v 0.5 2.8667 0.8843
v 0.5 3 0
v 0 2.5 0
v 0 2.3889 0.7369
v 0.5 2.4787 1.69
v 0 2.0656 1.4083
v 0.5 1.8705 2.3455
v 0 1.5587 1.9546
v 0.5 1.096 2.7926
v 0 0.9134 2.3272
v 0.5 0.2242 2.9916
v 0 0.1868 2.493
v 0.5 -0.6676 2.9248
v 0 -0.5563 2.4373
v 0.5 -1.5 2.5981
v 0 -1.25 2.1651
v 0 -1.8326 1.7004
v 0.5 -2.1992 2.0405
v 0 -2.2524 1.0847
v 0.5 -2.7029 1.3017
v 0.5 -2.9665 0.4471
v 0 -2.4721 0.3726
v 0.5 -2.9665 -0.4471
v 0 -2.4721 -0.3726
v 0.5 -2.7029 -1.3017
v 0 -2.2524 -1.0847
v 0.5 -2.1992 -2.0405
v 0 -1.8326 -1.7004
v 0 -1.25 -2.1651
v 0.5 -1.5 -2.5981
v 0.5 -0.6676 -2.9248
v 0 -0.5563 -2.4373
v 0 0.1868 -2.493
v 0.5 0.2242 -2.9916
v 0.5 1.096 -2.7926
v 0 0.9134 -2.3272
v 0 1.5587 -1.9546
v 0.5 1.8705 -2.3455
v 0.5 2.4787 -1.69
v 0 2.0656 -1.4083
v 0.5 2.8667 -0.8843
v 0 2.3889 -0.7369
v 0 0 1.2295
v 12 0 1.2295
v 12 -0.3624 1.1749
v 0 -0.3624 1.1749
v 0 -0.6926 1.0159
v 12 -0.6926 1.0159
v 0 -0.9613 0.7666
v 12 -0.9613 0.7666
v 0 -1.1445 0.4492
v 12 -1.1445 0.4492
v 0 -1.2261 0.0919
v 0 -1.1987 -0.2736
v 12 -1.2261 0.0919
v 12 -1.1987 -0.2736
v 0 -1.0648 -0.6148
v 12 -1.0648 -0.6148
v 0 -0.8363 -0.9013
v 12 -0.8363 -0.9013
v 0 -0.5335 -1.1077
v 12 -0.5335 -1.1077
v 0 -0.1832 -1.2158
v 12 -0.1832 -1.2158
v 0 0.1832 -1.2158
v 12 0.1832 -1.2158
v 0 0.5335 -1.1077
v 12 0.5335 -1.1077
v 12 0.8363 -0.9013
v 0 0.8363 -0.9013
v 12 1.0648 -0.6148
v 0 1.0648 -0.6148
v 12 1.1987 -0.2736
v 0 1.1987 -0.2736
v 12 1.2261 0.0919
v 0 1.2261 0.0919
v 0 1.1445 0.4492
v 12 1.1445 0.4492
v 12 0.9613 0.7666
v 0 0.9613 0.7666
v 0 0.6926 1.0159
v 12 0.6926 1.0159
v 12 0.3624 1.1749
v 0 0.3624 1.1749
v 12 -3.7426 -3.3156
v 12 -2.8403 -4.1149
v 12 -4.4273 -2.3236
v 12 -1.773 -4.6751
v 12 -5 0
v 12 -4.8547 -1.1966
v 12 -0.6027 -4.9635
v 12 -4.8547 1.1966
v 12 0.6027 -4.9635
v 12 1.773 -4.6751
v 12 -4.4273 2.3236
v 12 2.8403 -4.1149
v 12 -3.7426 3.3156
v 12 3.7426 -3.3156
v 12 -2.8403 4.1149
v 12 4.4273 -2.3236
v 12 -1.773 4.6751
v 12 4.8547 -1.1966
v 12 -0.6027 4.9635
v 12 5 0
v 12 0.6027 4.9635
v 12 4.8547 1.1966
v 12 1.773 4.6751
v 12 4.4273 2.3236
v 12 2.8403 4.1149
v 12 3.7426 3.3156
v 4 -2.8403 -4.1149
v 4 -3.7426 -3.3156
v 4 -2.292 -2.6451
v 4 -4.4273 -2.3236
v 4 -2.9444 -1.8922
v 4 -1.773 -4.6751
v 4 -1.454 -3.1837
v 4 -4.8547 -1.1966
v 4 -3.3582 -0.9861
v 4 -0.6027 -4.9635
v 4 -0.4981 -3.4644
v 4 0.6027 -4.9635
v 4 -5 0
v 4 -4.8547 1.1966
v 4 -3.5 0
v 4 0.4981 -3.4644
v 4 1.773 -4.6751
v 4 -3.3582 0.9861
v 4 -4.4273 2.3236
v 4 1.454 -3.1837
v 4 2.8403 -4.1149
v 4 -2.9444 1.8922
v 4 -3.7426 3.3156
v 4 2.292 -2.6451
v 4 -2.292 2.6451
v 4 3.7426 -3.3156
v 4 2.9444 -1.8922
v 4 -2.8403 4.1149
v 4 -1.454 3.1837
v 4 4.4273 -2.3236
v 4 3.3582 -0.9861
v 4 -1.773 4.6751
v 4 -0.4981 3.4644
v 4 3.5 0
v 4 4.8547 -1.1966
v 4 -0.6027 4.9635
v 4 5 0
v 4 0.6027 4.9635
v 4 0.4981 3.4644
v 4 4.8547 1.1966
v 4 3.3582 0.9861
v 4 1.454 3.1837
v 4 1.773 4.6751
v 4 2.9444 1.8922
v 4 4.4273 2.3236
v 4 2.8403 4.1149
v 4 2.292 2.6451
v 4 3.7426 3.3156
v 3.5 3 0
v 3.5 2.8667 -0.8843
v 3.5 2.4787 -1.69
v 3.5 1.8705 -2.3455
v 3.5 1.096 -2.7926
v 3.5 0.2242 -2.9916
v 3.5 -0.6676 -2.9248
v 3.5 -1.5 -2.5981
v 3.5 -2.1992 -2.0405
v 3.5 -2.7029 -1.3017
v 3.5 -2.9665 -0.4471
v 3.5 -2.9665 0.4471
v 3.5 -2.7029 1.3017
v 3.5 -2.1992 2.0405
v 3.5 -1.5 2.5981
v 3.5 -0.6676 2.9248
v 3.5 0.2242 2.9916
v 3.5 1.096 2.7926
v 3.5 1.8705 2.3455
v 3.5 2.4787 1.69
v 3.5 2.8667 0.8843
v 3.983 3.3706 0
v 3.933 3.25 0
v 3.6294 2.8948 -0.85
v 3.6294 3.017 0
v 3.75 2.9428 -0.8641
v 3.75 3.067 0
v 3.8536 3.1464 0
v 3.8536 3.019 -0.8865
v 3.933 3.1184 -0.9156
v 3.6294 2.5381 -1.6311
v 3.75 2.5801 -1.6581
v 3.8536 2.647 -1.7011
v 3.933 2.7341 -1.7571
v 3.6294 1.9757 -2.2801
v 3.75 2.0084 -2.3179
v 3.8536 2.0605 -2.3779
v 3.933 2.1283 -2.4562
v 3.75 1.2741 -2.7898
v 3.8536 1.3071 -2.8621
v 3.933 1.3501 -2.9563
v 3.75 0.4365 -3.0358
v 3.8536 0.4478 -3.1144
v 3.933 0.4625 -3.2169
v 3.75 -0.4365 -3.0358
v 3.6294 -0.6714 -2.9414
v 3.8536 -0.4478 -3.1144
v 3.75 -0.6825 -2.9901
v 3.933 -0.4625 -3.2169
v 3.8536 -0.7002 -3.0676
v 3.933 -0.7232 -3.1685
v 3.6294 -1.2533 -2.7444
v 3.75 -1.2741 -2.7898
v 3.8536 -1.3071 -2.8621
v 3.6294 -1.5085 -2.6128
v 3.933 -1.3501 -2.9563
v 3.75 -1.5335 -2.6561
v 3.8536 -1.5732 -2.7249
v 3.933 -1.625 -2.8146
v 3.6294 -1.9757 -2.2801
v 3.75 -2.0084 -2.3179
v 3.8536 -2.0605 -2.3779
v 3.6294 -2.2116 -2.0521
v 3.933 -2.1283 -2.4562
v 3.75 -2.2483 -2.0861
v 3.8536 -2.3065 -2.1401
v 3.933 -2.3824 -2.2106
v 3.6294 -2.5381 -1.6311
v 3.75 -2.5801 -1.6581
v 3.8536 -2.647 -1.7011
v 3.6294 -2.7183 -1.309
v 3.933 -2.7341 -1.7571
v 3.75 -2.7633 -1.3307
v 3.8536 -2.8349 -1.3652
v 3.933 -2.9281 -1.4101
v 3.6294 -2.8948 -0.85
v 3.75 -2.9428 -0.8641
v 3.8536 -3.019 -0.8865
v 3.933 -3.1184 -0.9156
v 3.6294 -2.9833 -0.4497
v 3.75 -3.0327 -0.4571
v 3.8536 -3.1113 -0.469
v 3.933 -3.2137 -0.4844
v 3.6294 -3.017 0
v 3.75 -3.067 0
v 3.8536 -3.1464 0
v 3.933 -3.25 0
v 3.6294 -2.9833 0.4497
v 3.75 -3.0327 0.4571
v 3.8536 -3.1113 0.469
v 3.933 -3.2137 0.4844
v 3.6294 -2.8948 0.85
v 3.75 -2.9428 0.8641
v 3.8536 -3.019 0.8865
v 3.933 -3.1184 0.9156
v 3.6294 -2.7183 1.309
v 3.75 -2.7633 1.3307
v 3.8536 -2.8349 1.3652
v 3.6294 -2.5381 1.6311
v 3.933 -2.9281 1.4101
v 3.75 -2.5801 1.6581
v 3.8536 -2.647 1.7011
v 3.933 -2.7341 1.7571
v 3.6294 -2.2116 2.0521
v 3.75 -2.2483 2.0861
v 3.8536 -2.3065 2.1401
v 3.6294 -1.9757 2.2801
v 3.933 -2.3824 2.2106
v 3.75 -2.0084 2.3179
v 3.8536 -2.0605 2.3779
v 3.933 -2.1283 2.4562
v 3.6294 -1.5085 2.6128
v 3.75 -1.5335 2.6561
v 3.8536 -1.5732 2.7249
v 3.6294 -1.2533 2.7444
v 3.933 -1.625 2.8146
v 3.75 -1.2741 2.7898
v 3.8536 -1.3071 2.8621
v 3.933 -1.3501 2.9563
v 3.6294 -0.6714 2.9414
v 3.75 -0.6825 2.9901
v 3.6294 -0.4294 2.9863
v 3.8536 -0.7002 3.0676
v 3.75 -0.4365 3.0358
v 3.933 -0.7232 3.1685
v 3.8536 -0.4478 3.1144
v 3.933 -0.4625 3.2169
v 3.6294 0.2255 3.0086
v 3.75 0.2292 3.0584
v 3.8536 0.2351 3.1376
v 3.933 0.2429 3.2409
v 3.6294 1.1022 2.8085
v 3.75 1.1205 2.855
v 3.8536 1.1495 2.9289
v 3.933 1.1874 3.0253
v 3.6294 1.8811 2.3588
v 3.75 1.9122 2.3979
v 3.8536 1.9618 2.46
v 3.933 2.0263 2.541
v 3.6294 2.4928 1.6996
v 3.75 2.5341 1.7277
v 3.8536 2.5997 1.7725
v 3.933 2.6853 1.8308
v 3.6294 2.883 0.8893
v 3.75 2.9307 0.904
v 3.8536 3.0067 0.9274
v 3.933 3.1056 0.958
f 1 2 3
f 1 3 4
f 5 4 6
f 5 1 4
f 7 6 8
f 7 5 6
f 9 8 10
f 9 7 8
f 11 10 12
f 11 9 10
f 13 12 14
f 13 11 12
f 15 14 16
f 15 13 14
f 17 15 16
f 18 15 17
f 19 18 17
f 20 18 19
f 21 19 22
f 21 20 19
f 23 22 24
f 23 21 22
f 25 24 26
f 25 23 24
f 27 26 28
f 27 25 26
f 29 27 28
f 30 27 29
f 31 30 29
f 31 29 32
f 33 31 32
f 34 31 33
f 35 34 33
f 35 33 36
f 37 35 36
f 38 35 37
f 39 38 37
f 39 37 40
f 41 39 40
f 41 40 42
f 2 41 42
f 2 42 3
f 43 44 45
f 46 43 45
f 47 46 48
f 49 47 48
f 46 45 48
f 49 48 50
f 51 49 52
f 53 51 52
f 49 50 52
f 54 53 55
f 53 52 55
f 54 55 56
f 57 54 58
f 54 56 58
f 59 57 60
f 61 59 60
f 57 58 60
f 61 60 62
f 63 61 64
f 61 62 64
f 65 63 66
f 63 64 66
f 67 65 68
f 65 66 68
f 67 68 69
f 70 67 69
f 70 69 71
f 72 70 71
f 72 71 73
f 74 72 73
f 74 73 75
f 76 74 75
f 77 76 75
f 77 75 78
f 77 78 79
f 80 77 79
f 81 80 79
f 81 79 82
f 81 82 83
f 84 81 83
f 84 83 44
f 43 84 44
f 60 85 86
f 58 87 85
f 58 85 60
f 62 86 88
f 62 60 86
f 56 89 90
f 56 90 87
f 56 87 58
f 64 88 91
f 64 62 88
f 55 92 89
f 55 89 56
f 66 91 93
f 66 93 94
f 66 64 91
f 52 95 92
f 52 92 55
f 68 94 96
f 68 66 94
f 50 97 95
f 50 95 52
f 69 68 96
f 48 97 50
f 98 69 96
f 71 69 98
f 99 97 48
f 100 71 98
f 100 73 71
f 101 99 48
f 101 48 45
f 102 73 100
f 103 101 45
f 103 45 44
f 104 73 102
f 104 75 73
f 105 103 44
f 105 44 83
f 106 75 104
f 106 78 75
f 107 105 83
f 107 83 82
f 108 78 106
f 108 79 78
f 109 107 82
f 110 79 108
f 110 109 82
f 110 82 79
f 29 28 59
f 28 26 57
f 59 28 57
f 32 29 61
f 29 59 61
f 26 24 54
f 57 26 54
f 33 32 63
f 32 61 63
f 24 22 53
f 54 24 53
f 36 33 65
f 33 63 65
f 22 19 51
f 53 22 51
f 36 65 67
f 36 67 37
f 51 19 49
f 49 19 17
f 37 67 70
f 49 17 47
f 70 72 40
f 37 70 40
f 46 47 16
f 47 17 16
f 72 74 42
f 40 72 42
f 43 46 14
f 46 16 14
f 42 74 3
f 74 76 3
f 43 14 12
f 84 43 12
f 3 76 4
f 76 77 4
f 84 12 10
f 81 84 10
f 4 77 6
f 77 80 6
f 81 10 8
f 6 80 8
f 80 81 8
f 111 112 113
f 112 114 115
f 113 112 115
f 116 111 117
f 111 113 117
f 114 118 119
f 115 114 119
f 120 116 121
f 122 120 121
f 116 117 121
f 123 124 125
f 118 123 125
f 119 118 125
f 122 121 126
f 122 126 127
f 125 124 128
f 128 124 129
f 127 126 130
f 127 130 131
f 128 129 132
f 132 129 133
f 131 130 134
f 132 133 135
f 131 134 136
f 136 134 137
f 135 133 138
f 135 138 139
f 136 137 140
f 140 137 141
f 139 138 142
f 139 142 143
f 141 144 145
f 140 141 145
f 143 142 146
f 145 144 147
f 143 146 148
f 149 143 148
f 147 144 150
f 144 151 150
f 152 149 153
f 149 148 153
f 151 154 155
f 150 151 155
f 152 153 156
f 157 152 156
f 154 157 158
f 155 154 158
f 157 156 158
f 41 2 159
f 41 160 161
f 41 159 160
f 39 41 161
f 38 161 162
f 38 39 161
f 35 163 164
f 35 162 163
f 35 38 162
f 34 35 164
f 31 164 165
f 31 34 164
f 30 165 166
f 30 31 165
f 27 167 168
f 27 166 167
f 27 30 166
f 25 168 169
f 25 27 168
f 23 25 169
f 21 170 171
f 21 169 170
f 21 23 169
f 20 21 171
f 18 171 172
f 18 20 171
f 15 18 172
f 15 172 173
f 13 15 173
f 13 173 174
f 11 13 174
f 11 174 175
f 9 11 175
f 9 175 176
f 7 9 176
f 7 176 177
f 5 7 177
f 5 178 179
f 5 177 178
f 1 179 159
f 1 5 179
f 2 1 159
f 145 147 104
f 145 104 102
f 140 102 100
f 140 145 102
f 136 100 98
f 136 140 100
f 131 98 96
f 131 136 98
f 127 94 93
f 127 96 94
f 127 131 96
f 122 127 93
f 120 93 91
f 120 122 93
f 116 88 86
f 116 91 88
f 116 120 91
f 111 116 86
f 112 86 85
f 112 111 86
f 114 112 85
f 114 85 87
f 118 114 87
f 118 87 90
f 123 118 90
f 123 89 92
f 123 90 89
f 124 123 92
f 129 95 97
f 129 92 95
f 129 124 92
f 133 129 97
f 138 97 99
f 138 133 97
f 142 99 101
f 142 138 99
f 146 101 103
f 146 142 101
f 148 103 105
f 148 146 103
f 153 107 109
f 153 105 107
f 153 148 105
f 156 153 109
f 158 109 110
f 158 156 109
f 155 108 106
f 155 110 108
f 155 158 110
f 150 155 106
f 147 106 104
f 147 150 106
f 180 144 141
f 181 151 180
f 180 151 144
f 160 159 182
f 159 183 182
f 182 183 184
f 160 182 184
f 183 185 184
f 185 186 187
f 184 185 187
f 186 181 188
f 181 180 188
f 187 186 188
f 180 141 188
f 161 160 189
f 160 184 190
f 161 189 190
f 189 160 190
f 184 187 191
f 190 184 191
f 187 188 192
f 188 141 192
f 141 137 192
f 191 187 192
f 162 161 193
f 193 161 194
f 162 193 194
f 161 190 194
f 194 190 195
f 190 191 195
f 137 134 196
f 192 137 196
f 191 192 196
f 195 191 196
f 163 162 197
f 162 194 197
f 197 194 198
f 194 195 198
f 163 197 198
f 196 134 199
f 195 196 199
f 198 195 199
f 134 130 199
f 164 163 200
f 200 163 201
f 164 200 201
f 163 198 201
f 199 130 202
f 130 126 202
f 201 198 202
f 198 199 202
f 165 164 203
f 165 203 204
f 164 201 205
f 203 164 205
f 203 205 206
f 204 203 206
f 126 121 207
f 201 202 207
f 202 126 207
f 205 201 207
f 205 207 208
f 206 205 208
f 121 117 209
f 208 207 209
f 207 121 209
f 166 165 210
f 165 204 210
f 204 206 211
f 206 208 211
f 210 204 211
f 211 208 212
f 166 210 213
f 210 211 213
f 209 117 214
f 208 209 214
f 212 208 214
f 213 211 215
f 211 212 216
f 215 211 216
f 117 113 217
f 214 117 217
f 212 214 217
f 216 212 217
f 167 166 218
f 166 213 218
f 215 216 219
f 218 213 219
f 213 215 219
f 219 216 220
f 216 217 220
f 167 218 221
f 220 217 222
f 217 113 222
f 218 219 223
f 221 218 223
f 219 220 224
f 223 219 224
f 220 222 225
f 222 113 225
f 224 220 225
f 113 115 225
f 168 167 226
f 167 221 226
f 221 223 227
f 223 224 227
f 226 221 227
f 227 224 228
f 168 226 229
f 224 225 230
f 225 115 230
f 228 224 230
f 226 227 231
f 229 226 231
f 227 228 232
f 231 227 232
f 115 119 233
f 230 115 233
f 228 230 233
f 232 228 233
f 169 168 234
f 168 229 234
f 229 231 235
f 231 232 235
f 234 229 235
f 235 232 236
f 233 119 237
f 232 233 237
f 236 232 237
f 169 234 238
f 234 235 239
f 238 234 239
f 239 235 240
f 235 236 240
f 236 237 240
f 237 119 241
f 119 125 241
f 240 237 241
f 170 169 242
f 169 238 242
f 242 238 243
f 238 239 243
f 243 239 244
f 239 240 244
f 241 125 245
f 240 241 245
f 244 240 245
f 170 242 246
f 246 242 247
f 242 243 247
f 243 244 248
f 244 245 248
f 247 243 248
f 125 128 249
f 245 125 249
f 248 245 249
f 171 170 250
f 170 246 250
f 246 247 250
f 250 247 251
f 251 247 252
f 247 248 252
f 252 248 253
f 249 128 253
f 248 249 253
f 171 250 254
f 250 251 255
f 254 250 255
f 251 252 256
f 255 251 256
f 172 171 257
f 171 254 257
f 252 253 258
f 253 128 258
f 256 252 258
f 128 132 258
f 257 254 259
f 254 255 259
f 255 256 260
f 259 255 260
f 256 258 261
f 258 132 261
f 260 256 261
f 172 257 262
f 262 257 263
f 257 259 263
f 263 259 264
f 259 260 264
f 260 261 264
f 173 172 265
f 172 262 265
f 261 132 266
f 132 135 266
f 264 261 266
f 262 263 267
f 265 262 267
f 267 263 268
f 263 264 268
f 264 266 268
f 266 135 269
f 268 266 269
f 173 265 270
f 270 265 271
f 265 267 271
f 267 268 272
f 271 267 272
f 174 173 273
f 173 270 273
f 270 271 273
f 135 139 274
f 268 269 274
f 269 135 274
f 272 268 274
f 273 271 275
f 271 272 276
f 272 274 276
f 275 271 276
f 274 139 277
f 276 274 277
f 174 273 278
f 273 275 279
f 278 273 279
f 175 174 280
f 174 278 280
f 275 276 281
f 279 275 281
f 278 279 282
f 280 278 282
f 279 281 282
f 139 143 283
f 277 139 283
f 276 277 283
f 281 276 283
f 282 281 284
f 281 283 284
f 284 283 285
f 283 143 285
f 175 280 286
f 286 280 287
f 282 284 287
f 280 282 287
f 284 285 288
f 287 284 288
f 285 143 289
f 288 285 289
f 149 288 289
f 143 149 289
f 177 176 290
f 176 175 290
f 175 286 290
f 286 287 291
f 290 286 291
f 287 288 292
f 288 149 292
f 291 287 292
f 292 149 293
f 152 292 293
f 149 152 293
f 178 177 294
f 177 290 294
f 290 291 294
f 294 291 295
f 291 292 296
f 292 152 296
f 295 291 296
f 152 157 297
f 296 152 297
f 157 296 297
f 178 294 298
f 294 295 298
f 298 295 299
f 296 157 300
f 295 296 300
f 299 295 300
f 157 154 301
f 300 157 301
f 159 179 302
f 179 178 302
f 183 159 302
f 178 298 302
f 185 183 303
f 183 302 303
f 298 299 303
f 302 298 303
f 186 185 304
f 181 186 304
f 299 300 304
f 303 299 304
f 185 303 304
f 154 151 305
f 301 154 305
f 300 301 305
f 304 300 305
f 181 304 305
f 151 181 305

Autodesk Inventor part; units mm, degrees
ref_plane "YZ Plane" through (0, 0, 0) normal (1, 0, 0) x (0, 1, 0)
ref_plane "XZ Plane" through (0, 0, 0) normal (0, 1, 0) x (-1, 0, 0)
ref_plane "XY Plane" through (0, 0, 0) normal (0, 0, 1) x (1, 0, 0)
sketch "Sketch1" plane through (0, 0, 0) normal (0, 0, 1) x (1, 0, 0)
  line L0 (0, 0) -> (4, 0)
  line L1 (4, 0) -> (4, 3)
  line L2 (4, 3) -> (0, 3)
  line L3 (0, 3) -> (0, 0)
  line L4 (4, 0) -> (12, 0)
  line L5 (12, 0) -> (12, 5)
  line L6 (12, 5) -> (4, 5)
  line L7 (4, 5) -> (4, 0)
  line L8 (0, 0) -> (12, 0)
  dimension "d0" = 5
  dimension "d1" = 3
  dimension "d2" = 4
  dimension "d3" = 8
revolve "Revolution1" add sketch "Sketch1" angle 360 about axis through (4, 0, 0) along (1, 0, 0)
fillet "Fillet1" radius 0.5 1 edges at (4, -3, 0)
chamfer "Chamfer1" distance 0.5 angle 45 1 edges at (0, -3, 0)
sketch "Sketch2" plane through (0, 0, 0) normal (-1, 0, 0) x (0, 0, 1)
  circle A0 centre (0, 0) radius 3 projected
  point P0 (0, 0)
  point P1 (0, 0)
hole "Hole1" at (0, 0, 0) direction (1, 0, 0) diameter 2.459 end through all thread size "M3x0.5" class "6H" standard "ANSI Metric M Profile"
properties part number "Selection_Lever Mount Piece" material "Aluminum 6061"
